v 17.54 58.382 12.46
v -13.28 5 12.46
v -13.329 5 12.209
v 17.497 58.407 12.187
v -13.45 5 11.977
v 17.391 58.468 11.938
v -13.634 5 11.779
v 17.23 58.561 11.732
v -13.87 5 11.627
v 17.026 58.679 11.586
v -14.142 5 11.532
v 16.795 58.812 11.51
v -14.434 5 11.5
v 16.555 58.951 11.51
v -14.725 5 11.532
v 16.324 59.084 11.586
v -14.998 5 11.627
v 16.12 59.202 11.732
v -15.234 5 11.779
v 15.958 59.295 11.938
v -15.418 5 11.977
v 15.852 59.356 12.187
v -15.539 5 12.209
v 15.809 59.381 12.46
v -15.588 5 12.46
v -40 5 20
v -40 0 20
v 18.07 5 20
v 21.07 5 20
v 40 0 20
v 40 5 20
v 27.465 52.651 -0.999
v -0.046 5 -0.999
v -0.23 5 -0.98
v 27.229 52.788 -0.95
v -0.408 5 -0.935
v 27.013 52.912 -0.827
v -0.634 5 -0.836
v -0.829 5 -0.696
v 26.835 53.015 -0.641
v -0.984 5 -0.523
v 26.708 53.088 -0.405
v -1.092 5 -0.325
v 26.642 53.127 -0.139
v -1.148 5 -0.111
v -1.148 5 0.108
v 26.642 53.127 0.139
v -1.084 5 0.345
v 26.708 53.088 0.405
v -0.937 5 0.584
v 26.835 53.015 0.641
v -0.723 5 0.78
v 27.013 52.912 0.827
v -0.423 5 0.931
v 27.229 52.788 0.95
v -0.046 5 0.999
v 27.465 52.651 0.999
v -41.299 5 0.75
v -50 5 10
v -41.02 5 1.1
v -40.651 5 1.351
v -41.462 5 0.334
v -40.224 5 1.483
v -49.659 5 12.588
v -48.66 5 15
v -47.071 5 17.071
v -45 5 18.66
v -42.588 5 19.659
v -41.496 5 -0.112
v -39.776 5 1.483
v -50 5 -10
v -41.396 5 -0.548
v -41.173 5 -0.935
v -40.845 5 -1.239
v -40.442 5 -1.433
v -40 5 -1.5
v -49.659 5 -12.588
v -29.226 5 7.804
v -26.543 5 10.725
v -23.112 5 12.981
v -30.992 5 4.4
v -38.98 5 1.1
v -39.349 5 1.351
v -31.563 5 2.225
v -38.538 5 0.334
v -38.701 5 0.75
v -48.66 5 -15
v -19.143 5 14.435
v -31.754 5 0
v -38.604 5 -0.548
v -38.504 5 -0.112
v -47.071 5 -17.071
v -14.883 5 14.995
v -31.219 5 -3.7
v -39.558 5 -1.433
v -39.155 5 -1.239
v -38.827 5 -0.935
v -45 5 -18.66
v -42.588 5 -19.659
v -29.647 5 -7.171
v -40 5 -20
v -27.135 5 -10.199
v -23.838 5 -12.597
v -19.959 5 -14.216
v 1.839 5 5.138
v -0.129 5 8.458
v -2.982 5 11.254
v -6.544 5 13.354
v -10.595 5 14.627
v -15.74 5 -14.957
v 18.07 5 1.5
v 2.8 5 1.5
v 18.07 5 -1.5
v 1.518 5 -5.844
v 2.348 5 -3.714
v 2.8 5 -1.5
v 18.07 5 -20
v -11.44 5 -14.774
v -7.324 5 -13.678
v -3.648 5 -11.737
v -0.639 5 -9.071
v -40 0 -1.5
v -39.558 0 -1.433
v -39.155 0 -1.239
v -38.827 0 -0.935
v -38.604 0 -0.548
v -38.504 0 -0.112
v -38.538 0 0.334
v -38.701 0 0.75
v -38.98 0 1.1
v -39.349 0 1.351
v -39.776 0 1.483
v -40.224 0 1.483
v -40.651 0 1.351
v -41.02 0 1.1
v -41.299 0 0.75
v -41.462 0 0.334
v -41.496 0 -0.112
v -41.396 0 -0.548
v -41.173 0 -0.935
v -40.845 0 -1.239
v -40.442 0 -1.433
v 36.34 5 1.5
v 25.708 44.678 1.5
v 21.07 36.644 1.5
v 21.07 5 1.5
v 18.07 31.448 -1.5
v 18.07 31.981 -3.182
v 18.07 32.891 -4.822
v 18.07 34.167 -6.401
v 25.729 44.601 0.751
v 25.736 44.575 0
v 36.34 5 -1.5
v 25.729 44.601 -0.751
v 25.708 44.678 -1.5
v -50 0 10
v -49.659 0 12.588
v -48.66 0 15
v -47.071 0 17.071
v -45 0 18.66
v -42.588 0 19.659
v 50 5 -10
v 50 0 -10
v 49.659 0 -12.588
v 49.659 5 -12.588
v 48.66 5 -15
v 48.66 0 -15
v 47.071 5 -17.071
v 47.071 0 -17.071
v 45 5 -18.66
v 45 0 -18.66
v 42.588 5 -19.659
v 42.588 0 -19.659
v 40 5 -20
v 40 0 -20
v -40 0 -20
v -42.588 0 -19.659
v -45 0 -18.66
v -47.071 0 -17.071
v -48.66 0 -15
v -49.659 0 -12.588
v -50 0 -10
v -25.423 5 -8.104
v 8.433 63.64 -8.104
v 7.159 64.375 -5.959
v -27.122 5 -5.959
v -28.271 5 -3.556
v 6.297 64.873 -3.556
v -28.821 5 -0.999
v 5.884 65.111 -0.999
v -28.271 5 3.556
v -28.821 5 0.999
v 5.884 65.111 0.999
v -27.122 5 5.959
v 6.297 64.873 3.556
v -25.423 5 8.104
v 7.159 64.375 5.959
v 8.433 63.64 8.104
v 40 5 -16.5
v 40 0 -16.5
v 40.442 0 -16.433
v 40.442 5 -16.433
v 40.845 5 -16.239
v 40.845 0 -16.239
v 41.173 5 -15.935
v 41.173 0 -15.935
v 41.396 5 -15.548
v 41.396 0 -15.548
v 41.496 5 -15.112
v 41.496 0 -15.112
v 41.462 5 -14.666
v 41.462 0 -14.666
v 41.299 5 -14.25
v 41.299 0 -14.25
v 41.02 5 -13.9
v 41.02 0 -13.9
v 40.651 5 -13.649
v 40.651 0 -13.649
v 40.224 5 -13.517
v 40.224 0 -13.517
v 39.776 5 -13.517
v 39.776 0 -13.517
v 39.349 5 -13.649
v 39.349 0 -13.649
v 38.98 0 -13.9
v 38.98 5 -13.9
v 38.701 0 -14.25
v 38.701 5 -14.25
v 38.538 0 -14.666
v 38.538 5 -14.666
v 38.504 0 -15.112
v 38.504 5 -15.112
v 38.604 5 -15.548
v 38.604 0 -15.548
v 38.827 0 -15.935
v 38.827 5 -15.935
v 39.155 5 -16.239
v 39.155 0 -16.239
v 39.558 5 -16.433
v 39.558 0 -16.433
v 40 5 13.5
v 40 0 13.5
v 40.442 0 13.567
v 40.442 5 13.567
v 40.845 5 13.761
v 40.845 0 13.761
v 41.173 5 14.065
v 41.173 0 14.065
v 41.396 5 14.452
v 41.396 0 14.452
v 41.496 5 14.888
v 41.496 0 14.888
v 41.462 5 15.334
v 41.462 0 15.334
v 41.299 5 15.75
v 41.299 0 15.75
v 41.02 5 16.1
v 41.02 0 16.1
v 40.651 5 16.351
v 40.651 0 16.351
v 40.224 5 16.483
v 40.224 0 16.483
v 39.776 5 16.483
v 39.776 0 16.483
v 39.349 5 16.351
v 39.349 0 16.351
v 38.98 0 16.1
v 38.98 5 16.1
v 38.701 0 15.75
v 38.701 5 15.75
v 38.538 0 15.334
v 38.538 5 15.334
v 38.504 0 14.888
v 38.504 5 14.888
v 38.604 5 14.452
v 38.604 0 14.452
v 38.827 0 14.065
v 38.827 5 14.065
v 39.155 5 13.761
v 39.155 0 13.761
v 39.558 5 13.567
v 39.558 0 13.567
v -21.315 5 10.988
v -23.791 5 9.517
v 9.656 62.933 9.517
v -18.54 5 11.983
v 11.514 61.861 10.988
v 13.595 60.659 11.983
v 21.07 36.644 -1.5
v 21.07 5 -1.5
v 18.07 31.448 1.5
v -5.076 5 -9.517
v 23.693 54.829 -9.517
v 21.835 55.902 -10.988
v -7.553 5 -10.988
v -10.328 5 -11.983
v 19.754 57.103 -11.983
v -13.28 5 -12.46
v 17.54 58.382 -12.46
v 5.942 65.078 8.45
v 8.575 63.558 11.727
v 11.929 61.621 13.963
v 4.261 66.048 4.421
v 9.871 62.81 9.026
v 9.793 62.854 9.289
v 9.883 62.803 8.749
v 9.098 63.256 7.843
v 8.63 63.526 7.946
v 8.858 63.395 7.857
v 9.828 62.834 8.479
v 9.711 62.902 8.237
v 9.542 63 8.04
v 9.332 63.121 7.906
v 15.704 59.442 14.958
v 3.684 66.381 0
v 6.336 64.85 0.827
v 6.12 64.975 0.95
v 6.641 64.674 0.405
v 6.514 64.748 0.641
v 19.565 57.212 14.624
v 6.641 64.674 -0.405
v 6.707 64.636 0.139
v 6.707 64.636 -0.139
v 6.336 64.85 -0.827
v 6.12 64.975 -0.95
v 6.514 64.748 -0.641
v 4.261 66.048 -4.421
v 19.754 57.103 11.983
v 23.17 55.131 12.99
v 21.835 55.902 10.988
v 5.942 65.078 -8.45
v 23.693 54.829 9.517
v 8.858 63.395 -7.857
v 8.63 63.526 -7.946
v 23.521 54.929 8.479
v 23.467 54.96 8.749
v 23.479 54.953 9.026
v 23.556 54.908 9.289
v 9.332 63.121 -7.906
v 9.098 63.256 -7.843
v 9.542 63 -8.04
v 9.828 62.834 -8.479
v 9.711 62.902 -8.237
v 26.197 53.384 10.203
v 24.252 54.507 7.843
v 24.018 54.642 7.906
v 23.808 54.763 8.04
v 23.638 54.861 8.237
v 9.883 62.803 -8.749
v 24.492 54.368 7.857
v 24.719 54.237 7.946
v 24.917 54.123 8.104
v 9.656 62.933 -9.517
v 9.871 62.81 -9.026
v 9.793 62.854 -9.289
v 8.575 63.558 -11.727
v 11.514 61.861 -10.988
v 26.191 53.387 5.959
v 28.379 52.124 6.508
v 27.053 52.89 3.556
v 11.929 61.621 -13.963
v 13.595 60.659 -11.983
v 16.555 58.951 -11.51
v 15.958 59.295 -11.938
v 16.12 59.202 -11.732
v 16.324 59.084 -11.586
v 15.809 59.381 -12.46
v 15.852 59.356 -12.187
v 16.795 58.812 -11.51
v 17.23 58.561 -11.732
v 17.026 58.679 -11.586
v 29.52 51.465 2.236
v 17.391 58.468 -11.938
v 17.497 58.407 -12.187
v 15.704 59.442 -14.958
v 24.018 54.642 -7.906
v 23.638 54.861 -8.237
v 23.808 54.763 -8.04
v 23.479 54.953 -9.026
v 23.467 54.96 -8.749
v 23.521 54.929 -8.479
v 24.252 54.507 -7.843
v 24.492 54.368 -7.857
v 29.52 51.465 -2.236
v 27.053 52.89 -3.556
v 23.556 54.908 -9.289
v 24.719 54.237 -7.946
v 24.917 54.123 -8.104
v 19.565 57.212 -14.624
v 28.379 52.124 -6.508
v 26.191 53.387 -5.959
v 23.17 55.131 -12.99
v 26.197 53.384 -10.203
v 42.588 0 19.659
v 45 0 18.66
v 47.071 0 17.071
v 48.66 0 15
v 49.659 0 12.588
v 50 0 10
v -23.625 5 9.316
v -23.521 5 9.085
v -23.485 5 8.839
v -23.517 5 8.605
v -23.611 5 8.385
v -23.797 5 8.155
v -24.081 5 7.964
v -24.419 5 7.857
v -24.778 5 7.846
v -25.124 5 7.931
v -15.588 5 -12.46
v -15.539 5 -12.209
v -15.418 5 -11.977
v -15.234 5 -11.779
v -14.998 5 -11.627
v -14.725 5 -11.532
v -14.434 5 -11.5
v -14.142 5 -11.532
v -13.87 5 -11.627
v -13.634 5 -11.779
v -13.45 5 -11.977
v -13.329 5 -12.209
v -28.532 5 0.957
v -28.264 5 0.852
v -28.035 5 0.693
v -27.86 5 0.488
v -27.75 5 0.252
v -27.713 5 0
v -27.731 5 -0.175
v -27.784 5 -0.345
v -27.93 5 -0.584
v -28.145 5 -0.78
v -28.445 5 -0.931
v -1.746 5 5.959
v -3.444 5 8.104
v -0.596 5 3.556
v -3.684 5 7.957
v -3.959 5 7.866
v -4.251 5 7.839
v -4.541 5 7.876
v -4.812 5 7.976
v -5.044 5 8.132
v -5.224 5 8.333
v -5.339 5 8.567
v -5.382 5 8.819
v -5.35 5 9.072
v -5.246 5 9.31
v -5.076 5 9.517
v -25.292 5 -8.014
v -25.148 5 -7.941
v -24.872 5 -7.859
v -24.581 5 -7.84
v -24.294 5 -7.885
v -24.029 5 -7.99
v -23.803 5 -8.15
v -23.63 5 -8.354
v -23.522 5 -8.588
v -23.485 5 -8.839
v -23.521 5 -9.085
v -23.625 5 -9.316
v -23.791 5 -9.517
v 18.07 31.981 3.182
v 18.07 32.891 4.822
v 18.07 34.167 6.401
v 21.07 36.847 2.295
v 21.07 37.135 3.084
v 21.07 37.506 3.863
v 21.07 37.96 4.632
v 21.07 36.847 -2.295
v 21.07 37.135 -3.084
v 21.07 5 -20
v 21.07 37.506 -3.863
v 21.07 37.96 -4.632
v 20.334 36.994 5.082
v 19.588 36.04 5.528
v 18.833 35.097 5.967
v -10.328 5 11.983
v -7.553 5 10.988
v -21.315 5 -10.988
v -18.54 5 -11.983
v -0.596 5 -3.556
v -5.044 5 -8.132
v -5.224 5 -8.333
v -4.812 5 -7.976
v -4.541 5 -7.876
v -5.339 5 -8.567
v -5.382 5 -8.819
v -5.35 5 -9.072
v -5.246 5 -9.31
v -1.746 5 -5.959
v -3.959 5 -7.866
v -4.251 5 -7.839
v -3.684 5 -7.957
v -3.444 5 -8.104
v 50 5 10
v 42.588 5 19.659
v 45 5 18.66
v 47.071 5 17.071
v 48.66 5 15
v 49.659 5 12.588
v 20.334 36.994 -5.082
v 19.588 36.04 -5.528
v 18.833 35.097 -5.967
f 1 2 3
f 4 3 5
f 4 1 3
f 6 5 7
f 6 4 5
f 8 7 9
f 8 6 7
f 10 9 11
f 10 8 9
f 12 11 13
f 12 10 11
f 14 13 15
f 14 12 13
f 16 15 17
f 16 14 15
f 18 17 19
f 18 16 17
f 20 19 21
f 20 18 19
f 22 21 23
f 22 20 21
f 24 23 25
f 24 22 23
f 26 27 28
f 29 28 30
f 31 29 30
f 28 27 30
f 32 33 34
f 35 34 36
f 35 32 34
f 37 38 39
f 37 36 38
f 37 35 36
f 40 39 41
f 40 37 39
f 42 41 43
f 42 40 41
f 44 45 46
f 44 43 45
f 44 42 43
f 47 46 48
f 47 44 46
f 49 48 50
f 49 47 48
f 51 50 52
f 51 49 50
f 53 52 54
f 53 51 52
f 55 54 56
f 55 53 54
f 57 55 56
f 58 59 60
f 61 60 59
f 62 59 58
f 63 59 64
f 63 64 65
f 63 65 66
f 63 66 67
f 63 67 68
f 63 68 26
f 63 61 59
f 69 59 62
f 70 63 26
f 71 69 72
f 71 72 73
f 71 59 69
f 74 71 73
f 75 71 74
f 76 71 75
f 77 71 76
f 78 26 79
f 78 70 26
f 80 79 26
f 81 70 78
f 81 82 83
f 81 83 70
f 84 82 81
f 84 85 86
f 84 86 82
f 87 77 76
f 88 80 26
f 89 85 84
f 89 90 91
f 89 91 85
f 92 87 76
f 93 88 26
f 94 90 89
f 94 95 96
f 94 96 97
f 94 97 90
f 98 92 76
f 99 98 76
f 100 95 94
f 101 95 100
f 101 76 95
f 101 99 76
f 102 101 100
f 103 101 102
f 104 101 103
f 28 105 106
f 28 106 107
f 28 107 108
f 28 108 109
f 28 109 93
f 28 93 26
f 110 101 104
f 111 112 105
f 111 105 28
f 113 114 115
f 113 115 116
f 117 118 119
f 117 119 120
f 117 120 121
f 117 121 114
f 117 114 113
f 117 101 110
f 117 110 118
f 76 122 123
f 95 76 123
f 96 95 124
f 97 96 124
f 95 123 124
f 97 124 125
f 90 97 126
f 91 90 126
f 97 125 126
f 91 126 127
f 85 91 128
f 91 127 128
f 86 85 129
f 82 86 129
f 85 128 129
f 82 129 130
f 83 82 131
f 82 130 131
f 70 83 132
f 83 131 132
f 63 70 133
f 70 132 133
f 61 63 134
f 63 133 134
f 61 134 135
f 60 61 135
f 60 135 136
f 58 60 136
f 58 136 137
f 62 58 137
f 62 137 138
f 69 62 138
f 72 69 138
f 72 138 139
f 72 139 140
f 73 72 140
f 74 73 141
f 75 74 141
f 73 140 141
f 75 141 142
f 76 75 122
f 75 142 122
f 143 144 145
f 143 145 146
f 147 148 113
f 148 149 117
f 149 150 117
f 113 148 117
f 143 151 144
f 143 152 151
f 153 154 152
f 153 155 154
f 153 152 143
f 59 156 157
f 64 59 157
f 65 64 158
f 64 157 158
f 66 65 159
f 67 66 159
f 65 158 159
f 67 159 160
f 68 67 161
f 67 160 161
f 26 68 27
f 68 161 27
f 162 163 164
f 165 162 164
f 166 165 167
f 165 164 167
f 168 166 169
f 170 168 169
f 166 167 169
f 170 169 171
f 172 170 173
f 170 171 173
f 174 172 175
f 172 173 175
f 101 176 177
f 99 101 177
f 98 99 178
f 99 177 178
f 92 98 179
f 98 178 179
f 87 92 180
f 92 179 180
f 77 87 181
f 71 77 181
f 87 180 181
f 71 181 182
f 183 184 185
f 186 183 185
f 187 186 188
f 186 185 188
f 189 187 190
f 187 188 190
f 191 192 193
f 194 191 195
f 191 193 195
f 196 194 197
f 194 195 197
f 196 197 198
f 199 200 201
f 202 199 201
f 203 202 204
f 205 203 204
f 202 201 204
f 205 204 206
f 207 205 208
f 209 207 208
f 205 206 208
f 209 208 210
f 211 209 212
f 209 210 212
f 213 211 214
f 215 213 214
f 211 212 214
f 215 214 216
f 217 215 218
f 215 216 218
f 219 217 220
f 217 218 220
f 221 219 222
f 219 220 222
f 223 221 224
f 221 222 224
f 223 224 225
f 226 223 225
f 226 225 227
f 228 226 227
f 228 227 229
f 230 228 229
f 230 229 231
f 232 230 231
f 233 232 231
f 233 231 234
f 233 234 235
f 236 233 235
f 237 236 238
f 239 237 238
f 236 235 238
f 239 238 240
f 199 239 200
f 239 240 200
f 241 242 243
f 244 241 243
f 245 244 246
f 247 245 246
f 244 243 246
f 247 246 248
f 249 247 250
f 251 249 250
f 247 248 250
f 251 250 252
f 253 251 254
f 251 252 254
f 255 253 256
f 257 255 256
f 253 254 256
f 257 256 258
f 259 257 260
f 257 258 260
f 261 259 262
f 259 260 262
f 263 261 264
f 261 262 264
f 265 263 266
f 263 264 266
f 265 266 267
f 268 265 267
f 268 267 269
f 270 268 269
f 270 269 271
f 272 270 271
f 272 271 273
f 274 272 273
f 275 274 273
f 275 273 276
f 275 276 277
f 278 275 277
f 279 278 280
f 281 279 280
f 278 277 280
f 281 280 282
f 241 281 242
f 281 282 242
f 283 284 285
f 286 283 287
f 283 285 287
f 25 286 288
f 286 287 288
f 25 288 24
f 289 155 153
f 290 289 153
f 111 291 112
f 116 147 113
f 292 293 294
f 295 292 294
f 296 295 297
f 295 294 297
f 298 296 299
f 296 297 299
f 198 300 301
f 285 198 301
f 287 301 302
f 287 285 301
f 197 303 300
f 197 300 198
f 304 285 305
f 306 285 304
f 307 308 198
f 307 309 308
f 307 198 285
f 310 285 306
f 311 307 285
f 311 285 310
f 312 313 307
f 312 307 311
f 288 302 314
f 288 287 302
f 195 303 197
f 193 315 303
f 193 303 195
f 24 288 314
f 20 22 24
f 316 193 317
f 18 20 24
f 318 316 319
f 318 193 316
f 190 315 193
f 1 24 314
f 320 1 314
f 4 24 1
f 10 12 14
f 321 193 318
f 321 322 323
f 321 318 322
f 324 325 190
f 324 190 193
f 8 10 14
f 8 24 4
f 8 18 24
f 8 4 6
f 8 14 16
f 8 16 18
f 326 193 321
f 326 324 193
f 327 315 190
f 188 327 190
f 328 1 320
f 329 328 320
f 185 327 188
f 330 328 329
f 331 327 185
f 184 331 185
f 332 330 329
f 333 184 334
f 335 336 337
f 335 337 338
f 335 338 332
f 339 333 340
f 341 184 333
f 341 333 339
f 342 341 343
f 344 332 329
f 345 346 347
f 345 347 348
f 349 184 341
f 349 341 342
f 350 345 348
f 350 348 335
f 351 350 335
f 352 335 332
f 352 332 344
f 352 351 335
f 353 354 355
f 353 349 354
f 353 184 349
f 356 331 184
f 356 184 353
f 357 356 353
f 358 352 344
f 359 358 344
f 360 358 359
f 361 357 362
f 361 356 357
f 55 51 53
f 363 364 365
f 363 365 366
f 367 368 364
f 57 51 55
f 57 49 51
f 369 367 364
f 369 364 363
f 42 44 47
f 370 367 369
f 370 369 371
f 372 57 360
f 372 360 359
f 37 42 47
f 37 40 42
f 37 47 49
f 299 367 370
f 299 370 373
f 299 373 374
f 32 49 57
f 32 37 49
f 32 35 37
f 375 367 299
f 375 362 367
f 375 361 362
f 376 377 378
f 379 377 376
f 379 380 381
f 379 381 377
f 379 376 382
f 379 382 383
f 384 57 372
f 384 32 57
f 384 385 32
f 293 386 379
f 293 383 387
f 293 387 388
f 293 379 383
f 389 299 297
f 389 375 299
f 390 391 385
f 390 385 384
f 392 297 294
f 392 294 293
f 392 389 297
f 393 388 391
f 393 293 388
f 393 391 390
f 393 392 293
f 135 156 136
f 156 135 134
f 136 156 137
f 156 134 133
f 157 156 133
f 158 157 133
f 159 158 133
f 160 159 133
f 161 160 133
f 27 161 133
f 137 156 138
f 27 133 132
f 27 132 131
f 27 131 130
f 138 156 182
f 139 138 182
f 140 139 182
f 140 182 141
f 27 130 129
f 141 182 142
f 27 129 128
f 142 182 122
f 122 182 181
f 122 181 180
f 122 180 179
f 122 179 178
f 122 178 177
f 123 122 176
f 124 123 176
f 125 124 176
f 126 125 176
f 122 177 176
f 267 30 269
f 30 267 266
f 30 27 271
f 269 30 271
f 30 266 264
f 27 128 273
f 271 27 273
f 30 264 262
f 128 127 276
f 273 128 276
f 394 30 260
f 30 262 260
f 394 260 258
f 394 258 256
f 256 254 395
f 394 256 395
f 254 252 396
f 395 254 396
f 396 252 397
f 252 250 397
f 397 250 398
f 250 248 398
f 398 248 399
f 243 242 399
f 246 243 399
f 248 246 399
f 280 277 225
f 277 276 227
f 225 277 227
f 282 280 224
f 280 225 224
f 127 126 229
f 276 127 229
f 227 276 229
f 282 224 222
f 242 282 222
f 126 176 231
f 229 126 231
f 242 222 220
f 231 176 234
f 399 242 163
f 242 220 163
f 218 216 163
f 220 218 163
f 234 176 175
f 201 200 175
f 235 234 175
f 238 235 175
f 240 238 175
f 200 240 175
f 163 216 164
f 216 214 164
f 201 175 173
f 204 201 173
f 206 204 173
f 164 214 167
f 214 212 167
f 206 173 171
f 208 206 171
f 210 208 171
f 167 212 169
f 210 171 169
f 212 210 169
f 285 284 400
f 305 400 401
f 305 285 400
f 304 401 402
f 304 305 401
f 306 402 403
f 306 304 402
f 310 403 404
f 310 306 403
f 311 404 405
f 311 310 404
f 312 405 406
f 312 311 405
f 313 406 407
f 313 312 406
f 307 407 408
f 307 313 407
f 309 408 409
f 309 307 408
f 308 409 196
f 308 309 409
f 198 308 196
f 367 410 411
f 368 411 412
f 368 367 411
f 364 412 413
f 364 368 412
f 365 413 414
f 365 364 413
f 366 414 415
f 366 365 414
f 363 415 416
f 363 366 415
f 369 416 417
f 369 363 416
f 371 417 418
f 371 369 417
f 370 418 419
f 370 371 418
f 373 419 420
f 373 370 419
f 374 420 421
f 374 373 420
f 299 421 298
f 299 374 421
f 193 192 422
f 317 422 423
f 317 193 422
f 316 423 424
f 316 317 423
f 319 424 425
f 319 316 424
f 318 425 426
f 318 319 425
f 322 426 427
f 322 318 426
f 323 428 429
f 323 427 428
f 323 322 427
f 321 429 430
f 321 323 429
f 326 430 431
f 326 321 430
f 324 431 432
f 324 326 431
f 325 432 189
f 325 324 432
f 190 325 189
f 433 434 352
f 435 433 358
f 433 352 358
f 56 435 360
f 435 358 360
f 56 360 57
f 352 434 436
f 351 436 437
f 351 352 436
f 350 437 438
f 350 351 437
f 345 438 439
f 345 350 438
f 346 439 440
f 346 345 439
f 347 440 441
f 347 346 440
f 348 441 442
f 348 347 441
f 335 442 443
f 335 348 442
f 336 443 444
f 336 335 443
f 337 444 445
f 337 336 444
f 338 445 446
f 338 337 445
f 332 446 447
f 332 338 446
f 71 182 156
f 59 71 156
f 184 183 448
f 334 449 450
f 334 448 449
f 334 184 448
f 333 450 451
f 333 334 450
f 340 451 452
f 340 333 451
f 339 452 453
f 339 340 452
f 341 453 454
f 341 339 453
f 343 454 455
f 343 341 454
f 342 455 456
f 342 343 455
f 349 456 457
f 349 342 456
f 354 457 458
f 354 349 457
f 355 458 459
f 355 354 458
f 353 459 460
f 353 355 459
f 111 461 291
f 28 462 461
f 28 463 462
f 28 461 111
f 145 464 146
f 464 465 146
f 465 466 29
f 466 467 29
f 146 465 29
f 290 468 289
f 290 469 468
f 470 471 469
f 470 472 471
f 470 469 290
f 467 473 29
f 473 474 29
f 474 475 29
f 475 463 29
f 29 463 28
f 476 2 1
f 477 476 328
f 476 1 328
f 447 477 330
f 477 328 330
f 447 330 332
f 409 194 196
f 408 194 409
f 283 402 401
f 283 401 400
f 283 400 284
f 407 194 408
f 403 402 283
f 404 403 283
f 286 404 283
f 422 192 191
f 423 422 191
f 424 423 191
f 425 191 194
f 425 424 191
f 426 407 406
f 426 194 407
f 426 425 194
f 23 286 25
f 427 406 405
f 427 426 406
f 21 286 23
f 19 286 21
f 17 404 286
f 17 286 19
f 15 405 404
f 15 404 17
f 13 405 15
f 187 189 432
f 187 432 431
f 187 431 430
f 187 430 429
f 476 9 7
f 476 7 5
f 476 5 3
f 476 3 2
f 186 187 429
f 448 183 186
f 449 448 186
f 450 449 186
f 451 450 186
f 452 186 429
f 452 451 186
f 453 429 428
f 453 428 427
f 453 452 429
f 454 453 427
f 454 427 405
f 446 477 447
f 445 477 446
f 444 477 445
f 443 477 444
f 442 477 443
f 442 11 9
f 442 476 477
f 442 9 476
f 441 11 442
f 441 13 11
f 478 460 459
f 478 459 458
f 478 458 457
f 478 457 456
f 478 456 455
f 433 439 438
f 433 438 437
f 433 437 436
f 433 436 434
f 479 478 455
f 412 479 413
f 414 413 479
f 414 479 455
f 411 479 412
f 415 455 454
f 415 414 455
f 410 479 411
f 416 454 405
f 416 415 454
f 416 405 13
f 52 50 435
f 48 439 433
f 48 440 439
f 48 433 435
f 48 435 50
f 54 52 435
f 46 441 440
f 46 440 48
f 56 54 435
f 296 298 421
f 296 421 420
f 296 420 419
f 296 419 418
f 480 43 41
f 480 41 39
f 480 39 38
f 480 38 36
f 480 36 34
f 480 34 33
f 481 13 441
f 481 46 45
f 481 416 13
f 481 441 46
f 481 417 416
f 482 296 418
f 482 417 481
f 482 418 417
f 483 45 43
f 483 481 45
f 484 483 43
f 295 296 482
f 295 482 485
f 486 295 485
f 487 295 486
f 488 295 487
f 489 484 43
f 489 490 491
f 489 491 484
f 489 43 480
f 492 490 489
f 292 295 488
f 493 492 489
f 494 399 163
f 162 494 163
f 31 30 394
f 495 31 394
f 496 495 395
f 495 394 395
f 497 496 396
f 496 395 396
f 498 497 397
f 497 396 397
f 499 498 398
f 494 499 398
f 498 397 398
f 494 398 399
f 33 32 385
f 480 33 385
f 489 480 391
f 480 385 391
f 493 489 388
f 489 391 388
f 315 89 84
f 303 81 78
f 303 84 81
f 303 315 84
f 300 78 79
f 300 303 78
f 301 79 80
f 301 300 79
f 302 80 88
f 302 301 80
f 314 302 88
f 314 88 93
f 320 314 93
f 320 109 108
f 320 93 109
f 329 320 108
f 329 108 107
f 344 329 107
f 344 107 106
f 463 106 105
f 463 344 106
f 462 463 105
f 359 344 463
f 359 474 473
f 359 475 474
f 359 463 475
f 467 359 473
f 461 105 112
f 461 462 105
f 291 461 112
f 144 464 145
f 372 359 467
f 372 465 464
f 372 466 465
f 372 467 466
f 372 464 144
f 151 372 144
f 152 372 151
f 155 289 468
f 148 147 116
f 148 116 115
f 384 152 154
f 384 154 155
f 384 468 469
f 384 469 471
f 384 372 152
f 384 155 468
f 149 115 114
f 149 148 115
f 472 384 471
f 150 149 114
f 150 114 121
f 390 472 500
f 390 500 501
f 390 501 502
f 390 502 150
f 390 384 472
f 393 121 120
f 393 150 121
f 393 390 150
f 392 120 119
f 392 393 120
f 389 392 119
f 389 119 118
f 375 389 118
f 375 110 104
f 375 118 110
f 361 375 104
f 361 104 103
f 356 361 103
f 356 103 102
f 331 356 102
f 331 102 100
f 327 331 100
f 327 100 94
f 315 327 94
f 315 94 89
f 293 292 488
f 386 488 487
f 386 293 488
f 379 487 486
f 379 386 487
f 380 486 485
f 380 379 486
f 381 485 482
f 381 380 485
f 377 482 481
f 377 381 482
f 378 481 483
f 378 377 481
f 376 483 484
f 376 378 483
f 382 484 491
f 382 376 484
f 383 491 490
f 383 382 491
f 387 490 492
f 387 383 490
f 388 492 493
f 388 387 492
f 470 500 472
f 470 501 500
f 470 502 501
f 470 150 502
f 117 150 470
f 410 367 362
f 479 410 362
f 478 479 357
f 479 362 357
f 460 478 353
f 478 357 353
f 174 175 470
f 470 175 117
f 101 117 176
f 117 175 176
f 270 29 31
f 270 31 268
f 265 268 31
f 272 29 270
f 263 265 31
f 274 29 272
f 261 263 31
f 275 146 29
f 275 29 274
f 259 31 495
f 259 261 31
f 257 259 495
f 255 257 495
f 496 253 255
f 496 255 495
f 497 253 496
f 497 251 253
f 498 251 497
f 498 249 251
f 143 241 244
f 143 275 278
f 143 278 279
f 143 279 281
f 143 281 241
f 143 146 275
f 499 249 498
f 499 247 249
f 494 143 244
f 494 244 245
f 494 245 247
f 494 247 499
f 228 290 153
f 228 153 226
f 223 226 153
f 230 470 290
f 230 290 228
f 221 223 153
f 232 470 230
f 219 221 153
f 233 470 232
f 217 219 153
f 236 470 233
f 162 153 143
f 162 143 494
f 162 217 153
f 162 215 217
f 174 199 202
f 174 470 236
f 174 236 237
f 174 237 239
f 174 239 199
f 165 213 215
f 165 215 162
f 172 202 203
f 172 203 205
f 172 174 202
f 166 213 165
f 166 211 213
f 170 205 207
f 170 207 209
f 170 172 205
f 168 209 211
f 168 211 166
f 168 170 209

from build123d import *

# Parameters (mm, degrees)
BOSS_EXTRUDE1_DEPTH = 5
BOSS_EXTRUDE2_REACH = 98.884
SKETCH2_R           = 15
SKETCH2_R_2         = 12.5
BOSS_EXTRUDE3_REACH = 98.884
SKETCH3_R           = 1
RIB1_REACH          = 87.478
SKETCH4_WALL_W      = 198.83792102
SKETCH4_WALL_H      = 3
RIB2_REACH          = 100.216
SKETCH5_WALL_W      = 242.211652072
SKETCH5_WALL_H      = 3
SKETCH6_R           = 1.5
CUT_EXTRUDE1_DEPTH  = 5


with BuildPart() as part:
    # Sketch1 → Boss-Extrude1 (new body)
    with BuildSketch(Plane(origin=(0, 0, 0), x_dir=(1, 0, 0), z_dir=(0, 1, 0))):
        with BuildLine():
            Line((40, 20), (-40, 20))
            ThreePointArc((-40, 20), (-47.071067812, 17.071067812), (-50, 10))
            Line((-50, 10), (-50, -10))
            ThreePointArc((-50, -10), (-47.071067812, -17.071067812), (-40, -20))
            Line((-40, -20), (40, -20))
            ThreePointArc((40, -20), (47.071067812, -17.071067812), (50, -10))
            Line((50, -10), (50, 10))
            ThreePointArc((50, 10), (47.071067812, 17.071067812), (40, 20))
        make_face()
    extrude(amount=BOSS_EXTRUDE1_DEPTH)

    # Boss-Extrude2: up to this plane
    boss_extrude2_end = Plane(origin=(40, 5, 10), z_dir=(0, -1, 0))
    # Sketch2 → Boss-Extrude2 (add, up to the surface)
    with BuildSketch(Plane(origin=(29.665063509, 51.381397208, 0), x_dir=(0, 0, -1), z_dir=(0.500000000000001, 0.866025403784438, 0)), mode=Mode.PRIVATE) as boss_extrude2_sk1:
        with Locations(Location((0, 15, 0), (0, 0, 90))):
            Circle(SKETCH2_R)
        with Locations(Location((0, 15, 0), (0, 0, 90))):
            Circle(SKETCH2_R_2, mode=Mode.SUBTRACT)
    boss_extrude2_tool1 = split(extrude(boss_extrude2_sk1.sketch, amount=-BOSS_EXTRUDE2_REACH, mode=Mode.PRIVATE), bisect_by=boss_extrude2_end, keep=Keep.BOTH, mode=Mode.PRIVATE)
    add(boss_extrude2_tool1.solids().sort_by_distance((29.29764, 51.593529, 0))[0])

    # Boss-Extrude3: up to this plane
    boss_extrude3_end = Plane(origin=(40, 5, 10), z_dir=(0, -1, 0))
    # Sketch3 → Boss-Extrude3 (add, up to the surface)
    with BuildSketch(Plane(origin=(29.665063509, 51.381397208, 0), x_dir=(0.8660254037844382, -0.500000000000001, 0), z_dir=(0.500000000000001, 0.8660254037844382, 0)), mode=Mode.PRIVATE) as boss_extrude3_sk1:
        with Locations((-2.5, 0)):
            Circle(SKETCH3_R)
    boss_extrude3_tool1 = split(extrude(boss_extrude3_sk1.sketch, amount=-BOSS_EXTRUDE3_REACH, mode=Mode.PRIVATE), bisect_by=boss_extrude3_end, keep=Keep.BOTH, mode=Mode.PRIVATE)
    add(boss_extrude3_tool1.solids().sort_by_distance((27.5, 52.631397, 0))[0])
    # Sketch3 → Boss-Extrude3 (add, up to the surface)
    with BuildSketch(Plane(origin=(29.665063509, 51.381397208, 0), x_dir=(0.8660254037844382, -0.500000000000001, 0), z_dir=(0.500000000000001, 0.8660254037844382, 0)), mode=Mode.PRIVATE) as boss_extrude3_sk2:
        with Locations((-6.161165235, -8.838834765)):
            Circle(SKETCH3_R)
    boss_extrude3_tool2 = split(extrude(boss_extrude3_sk2.sketch, amount=-BOSS_EXTRUDE3_REACH, mode=Mode.PRIVATE), bisect_by=boss_extrude3_end, keep=Keep.BOTH, mode=Mode.PRIVATE)
    add(boss_extrude3_tool2.solids().sort_by_distance((24.329338, 54.46198, 8.838835))[0])
    # Sketch3 → Boss-Extrude3 (add, up to the surface)
    with BuildSketch(Plane(origin=(29.665063509, 51.381397208, 0), x_dir=(0.8660254037844382, -0.500000000000001, 0), z_dir=(0.500000000000001, 0.8660254037844382, 0)), mode=Mode.PRIVATE) as boss_extrude3_sk3:
        with Locations((-15, -12.5)):
            Circle(SKETCH3_R)
    boss_extrude3_tool3 = split(extrude(boss_extrude3_sk3.sketch, amount=-BOSS_EXTRUDE3_REACH, mode=Mode.PRIVATE), bisect_by=boss_extrude3_end, keep=Keep.BOTH, mode=Mode.PRIVATE)
    add(boss_extrude3_tool3.solids().sort_by_distance((16.674682, 58.881397, 12.5))[0])
    # Sketch3 → Boss-Extrude3 (add, up to the surface)
    with BuildSketch(Plane(origin=(29.665063509, 51.381397208, 0), x_dir=(0.8660254037844382, -0.500000000000001, 0), z_dir=(0.500000000000001, 0.8660254037844382, 0)), mode=Mode.PRIVATE) as boss_extrude3_sk4:
        with Locations((-23.838834765, -8.838834765)):
            Circle(SKETCH3_R)
    boss_extrude3_tool4 = split(extrude(boss_extrude3_sk4.sketch, amount=-BOSS_EXTRUDE3_REACH, mode=Mode.PRIVATE), bisect_by=boss_extrude3_end, keep=Keep.BOTH, mode=Mode.PRIVATE)
    add(boss_extrude3_tool4.solids().sort_by_distance((9.020027, 63.300815, 8.838835))[0])
    # Sketch3 → Boss-Extrude3 (add, up to the surface)
    with BuildSketch(Plane(origin=(29.665063509, 51.381397208, 0), x_dir=(0.8660254037844382, -0.500000000000001, 0), z_dir=(0.500000000000001, 0.8660254037844382, 0)), mode=Mode.PRIVATE) as boss_extrude3_sk5:
        with Locations((-27.5, 0)):
            Circle(SKETCH3_R)
    boss_extrude3_tool5 = split(extrude(boss_extrude3_sk5.sketch, amount=-BOSS_EXTRUDE3_REACH, mode=Mode.PRIVATE), bisect_by=boss_extrude3_end, keep=Keep.BOTH, mode=Mode.PRIVATE)
    add(boss_extrude3_tool5.solids().sort_by_distance((5.849365, 65.131397, 0))[0])
    # Sketch3 → Boss-Extrude3 (add, up to the surface)
    with BuildSketch(Plane(origin=(29.665063509, 51.381397208, 0), x_dir=(0.8660254037844382, -0.500000000000001, 0), z_dir=(0.500000000000001, 0.8660254037844382, 0)), mode=Mode.PRIVATE) as boss_extrude3_sk6:
        with Locations((-23.838834765, 8.838834765)):
            Circle(SKETCH3_R)
    boss_extrude3_tool6 = split(extrude(boss_extrude3_sk6.sketch, amount=-BOSS_EXTRUDE3_REACH, mode=Mode.PRIVATE), bisect_by=boss_extrude3_end, keep=Keep.BOTH, mode=Mode.PRIVATE)
    add(boss_extrude3_tool6.solids().sort_by_distance((9.020027, 63.300815, -8.838835))[0])
    # Sketch3 → Boss-Extrude3 (add, up to the surface)
    with BuildSketch(Plane(origin=(29.665063509, 51.381397208, 0), x_dir=(0.8660254037844382, -0.500000000000001, 0), z_dir=(0.500000000000001, 0.8660254037844382, 0)), mode=Mode.PRIVATE) as boss_extrude3_sk7:
        with Locations((-15, 12.5)):
            Circle(SKETCH3_R)
    boss_extrude3_tool7 = split(extrude(boss_extrude3_sk7.sketch, amount=-BOSS_EXTRUDE3_REACH, mode=Mode.PRIVATE), bisect_by=boss_extrude3_end, keep=Keep.BOTH, mode=Mode.PRIVATE)
    add(boss_extrude3_tool7.solids().sort_by_distance((16.674682, 58.881397, -12.5))[0])
    # Sketch3 → Boss-Extrude3 (add, up to the surface)
    with BuildSketch(Plane(origin=(29.665063509, 51.381397208, 0), x_dir=(0.8660254037844382, -0.500000000000001, 0), z_dir=(0.500000000000001, 0.8660254037844382, 0)), mode=Mode.PRIVATE) as boss_extrude3_sk8:
        with Locations((-6.161165235, 8.838834765)):
            Circle(SKETCH3_R)
    boss_extrude3_tool8 = split(extrude(boss_extrude3_sk8.sketch, amount=-BOSS_EXTRUDE3_REACH, mode=Mode.PRIVATE), bisect_by=boss_extrude3_end, keep=Keep.BOTH, mode=Mode.PRIVATE)
    add(boss_extrude3_tool8.solids().sort_by_distance((24.329338, 54.46198, -8.838835))[0])

    # Sketch4 wall → Rib1 (add, up to next)
    with BuildSketch(Plane(origin=(31.650635095, 22.5, 0), x_dir=(0.258819045111, -0.965925826287, 0), z_dir=(0.965925826287, 0.258819045111, 0)), mode=Mode.PRIVATE) as rib1_sk1:
        Rectangle(SKETCH4_WALL_W, SKETCH4_WALL_H)
    rib1_tool1 = extrude(rib1_sk1.sketch, amount=-RIB1_REACH, mode=Mode.PRIVATE) - part.part
    add(rib1_tool1.solids().sort_by_distance((31.650635095, 22.5, 0))[0])

    # Sketch5 wall → Rib2 (add, up to next)
    with BuildSketch(Plane(origin=(19.569838586, 24.839013436, 10.75), x_dir=(0, -0.906326752135, 0.422577588573), z_dir=(0, -0.422577588573, -0.906326752135)), mode=Mode.PRIVATE) as rib2_sk1:
        Rectangle(SKETCH5_WALL_W, SKETCH5_WALL_H)
    rib2_tool1 = extrude(rib2_sk1.sketch, amount=RIB2_REACH, mode=Mode.PRIVATE) - part.part
    rib2 = rib2_tool1.solids().sort_by_distance((19.569838586, 24.839013436, 10.75))[0]
    add(rib2)

    # Mirror2: Rib2 across plane
    add(rib2.mirror(Plane.XY))

    # Sketch6 → Cut-Extrude1 (cut)
    with BuildSketch(Plane(origin=(0, 0, 0), x_dir=(-1, 0, 0), z_dir=(0, -1, 0))):
        with Locations(Location((-40, 15, 0), (0, 0, 90))):
            Circle(SKETCH6_R)
        with Locations(Location((-40, -15, 0), (0, 0, 90))):
            Circle(SKETCH6_R)
        with Locations(Location((40, 0, 0), (0, 0, 90))):
            Circle(SKETCH6_R)
    extrude(amount=-CUT_EXTRUDE1_DEPTH, mode=Mode.SUBTRACT)


solid = part.part
